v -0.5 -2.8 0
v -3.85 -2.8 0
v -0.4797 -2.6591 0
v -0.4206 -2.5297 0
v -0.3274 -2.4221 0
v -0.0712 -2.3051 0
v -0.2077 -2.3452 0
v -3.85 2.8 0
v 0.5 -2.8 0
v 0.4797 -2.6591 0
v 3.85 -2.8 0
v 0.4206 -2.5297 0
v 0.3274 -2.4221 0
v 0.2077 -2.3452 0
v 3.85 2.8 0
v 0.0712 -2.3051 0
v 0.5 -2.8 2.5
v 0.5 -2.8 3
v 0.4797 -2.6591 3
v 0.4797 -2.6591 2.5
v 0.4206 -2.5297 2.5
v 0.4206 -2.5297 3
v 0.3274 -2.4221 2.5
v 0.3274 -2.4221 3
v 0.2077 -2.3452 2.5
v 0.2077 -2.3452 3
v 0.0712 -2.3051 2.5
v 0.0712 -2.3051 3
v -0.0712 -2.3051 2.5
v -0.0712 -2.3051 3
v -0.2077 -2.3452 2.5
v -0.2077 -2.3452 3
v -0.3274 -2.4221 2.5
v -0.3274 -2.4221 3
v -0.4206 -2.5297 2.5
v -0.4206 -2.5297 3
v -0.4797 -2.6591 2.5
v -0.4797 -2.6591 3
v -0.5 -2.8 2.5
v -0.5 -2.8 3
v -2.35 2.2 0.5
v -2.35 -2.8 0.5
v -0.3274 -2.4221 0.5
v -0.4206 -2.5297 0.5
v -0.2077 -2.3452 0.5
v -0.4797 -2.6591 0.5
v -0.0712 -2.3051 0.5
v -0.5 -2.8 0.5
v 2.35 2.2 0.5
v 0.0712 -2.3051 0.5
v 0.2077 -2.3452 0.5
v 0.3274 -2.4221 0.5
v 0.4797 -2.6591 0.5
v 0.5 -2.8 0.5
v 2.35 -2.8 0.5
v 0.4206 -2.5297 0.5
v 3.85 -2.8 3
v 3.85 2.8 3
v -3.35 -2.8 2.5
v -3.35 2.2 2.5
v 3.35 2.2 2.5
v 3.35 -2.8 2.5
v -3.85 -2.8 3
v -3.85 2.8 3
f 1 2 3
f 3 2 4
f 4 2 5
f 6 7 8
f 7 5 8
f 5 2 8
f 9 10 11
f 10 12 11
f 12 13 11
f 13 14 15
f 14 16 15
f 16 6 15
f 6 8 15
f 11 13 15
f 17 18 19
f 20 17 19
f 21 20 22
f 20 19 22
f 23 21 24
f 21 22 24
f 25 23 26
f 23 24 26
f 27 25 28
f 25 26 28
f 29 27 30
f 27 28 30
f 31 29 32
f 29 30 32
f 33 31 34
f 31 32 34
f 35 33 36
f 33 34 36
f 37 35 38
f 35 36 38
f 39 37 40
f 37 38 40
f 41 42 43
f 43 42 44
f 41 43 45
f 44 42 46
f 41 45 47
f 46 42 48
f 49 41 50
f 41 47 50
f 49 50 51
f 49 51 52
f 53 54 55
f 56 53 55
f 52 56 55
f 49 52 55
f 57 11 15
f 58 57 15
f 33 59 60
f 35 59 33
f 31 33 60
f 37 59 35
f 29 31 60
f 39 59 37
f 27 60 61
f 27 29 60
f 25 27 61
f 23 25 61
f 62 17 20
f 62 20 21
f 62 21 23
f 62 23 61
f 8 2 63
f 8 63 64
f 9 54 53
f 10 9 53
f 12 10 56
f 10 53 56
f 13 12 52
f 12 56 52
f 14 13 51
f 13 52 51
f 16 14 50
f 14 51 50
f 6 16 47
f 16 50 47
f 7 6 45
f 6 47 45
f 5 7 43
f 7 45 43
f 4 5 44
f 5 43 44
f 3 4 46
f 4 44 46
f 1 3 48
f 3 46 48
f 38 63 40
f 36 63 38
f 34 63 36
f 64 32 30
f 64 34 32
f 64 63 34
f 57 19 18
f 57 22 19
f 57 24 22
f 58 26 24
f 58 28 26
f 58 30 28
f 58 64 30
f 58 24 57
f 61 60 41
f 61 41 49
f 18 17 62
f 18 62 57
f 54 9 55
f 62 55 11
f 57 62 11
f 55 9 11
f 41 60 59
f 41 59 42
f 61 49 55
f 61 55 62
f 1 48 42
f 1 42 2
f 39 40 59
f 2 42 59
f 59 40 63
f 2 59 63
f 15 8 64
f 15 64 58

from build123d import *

# Parameters (mm, degrees)
SKETCH_1_W          = 7.7
SKETCH_1_H          = 5.6
EXTRUDE_1_DEPTH     = 3
SKETCH_2_R          = 0.5
CUT_EXTRUDE_2_DEPTH = 8.8
SKETCH_3_W          = 6.7
SKETCH_3_H          = 2
CUT_EXTRUDE_3_DEPTH = 5
EXTRUDE_2_DEPTH     = 5


with BuildPart() as part:
    # Эскиз1 → Бобышка-Вытянуть1 (new body)
    with BuildSketch(Plane.XY):
        Rectangle(SKETCH_1_W, SKETCH_1_H)
    extrude(amount=EXTRUDE_1_DEPTH)

    # Эскиз2 → Вырез-Вытянуть2 (cut)
    with BuildSketch(Plane.XY.offset(3)):
        with Locations((0, -2.8)):
            Circle(SKETCH_2_R)
    extrude(amount=-CUT_EXTRUDE_2_DEPTH, mode=Mode.SUBTRACT)

    # Эскиз3 → Вырез-Вытянуть3 (cut)
    with BuildSketch(Plane.XZ.offset(2.8)):
        with Locations((0, 1.5)):
            Rectangle(SKETCH_3_W, SKETCH_3_H)
    extrude(amount=-CUT_EXTRUDE_3_DEPTH, mode=Mode.SUBTRACT)

    # Эскиз4 → Бобышка-Вытянуть2 (add)
    with BuildSketch(Plane.XZ.offset(-2.2)):
        Polygon((-3.35, 2.5), (-2.35, 0.5), (-3.35, 0.5), align=None)
        Polygon((3.35, 2.5), (3.35, 0.5), (2.35, 0.5), align=None)
    extrude(amount=EXTRUDE_2_DEPTH)


solid = part.part
